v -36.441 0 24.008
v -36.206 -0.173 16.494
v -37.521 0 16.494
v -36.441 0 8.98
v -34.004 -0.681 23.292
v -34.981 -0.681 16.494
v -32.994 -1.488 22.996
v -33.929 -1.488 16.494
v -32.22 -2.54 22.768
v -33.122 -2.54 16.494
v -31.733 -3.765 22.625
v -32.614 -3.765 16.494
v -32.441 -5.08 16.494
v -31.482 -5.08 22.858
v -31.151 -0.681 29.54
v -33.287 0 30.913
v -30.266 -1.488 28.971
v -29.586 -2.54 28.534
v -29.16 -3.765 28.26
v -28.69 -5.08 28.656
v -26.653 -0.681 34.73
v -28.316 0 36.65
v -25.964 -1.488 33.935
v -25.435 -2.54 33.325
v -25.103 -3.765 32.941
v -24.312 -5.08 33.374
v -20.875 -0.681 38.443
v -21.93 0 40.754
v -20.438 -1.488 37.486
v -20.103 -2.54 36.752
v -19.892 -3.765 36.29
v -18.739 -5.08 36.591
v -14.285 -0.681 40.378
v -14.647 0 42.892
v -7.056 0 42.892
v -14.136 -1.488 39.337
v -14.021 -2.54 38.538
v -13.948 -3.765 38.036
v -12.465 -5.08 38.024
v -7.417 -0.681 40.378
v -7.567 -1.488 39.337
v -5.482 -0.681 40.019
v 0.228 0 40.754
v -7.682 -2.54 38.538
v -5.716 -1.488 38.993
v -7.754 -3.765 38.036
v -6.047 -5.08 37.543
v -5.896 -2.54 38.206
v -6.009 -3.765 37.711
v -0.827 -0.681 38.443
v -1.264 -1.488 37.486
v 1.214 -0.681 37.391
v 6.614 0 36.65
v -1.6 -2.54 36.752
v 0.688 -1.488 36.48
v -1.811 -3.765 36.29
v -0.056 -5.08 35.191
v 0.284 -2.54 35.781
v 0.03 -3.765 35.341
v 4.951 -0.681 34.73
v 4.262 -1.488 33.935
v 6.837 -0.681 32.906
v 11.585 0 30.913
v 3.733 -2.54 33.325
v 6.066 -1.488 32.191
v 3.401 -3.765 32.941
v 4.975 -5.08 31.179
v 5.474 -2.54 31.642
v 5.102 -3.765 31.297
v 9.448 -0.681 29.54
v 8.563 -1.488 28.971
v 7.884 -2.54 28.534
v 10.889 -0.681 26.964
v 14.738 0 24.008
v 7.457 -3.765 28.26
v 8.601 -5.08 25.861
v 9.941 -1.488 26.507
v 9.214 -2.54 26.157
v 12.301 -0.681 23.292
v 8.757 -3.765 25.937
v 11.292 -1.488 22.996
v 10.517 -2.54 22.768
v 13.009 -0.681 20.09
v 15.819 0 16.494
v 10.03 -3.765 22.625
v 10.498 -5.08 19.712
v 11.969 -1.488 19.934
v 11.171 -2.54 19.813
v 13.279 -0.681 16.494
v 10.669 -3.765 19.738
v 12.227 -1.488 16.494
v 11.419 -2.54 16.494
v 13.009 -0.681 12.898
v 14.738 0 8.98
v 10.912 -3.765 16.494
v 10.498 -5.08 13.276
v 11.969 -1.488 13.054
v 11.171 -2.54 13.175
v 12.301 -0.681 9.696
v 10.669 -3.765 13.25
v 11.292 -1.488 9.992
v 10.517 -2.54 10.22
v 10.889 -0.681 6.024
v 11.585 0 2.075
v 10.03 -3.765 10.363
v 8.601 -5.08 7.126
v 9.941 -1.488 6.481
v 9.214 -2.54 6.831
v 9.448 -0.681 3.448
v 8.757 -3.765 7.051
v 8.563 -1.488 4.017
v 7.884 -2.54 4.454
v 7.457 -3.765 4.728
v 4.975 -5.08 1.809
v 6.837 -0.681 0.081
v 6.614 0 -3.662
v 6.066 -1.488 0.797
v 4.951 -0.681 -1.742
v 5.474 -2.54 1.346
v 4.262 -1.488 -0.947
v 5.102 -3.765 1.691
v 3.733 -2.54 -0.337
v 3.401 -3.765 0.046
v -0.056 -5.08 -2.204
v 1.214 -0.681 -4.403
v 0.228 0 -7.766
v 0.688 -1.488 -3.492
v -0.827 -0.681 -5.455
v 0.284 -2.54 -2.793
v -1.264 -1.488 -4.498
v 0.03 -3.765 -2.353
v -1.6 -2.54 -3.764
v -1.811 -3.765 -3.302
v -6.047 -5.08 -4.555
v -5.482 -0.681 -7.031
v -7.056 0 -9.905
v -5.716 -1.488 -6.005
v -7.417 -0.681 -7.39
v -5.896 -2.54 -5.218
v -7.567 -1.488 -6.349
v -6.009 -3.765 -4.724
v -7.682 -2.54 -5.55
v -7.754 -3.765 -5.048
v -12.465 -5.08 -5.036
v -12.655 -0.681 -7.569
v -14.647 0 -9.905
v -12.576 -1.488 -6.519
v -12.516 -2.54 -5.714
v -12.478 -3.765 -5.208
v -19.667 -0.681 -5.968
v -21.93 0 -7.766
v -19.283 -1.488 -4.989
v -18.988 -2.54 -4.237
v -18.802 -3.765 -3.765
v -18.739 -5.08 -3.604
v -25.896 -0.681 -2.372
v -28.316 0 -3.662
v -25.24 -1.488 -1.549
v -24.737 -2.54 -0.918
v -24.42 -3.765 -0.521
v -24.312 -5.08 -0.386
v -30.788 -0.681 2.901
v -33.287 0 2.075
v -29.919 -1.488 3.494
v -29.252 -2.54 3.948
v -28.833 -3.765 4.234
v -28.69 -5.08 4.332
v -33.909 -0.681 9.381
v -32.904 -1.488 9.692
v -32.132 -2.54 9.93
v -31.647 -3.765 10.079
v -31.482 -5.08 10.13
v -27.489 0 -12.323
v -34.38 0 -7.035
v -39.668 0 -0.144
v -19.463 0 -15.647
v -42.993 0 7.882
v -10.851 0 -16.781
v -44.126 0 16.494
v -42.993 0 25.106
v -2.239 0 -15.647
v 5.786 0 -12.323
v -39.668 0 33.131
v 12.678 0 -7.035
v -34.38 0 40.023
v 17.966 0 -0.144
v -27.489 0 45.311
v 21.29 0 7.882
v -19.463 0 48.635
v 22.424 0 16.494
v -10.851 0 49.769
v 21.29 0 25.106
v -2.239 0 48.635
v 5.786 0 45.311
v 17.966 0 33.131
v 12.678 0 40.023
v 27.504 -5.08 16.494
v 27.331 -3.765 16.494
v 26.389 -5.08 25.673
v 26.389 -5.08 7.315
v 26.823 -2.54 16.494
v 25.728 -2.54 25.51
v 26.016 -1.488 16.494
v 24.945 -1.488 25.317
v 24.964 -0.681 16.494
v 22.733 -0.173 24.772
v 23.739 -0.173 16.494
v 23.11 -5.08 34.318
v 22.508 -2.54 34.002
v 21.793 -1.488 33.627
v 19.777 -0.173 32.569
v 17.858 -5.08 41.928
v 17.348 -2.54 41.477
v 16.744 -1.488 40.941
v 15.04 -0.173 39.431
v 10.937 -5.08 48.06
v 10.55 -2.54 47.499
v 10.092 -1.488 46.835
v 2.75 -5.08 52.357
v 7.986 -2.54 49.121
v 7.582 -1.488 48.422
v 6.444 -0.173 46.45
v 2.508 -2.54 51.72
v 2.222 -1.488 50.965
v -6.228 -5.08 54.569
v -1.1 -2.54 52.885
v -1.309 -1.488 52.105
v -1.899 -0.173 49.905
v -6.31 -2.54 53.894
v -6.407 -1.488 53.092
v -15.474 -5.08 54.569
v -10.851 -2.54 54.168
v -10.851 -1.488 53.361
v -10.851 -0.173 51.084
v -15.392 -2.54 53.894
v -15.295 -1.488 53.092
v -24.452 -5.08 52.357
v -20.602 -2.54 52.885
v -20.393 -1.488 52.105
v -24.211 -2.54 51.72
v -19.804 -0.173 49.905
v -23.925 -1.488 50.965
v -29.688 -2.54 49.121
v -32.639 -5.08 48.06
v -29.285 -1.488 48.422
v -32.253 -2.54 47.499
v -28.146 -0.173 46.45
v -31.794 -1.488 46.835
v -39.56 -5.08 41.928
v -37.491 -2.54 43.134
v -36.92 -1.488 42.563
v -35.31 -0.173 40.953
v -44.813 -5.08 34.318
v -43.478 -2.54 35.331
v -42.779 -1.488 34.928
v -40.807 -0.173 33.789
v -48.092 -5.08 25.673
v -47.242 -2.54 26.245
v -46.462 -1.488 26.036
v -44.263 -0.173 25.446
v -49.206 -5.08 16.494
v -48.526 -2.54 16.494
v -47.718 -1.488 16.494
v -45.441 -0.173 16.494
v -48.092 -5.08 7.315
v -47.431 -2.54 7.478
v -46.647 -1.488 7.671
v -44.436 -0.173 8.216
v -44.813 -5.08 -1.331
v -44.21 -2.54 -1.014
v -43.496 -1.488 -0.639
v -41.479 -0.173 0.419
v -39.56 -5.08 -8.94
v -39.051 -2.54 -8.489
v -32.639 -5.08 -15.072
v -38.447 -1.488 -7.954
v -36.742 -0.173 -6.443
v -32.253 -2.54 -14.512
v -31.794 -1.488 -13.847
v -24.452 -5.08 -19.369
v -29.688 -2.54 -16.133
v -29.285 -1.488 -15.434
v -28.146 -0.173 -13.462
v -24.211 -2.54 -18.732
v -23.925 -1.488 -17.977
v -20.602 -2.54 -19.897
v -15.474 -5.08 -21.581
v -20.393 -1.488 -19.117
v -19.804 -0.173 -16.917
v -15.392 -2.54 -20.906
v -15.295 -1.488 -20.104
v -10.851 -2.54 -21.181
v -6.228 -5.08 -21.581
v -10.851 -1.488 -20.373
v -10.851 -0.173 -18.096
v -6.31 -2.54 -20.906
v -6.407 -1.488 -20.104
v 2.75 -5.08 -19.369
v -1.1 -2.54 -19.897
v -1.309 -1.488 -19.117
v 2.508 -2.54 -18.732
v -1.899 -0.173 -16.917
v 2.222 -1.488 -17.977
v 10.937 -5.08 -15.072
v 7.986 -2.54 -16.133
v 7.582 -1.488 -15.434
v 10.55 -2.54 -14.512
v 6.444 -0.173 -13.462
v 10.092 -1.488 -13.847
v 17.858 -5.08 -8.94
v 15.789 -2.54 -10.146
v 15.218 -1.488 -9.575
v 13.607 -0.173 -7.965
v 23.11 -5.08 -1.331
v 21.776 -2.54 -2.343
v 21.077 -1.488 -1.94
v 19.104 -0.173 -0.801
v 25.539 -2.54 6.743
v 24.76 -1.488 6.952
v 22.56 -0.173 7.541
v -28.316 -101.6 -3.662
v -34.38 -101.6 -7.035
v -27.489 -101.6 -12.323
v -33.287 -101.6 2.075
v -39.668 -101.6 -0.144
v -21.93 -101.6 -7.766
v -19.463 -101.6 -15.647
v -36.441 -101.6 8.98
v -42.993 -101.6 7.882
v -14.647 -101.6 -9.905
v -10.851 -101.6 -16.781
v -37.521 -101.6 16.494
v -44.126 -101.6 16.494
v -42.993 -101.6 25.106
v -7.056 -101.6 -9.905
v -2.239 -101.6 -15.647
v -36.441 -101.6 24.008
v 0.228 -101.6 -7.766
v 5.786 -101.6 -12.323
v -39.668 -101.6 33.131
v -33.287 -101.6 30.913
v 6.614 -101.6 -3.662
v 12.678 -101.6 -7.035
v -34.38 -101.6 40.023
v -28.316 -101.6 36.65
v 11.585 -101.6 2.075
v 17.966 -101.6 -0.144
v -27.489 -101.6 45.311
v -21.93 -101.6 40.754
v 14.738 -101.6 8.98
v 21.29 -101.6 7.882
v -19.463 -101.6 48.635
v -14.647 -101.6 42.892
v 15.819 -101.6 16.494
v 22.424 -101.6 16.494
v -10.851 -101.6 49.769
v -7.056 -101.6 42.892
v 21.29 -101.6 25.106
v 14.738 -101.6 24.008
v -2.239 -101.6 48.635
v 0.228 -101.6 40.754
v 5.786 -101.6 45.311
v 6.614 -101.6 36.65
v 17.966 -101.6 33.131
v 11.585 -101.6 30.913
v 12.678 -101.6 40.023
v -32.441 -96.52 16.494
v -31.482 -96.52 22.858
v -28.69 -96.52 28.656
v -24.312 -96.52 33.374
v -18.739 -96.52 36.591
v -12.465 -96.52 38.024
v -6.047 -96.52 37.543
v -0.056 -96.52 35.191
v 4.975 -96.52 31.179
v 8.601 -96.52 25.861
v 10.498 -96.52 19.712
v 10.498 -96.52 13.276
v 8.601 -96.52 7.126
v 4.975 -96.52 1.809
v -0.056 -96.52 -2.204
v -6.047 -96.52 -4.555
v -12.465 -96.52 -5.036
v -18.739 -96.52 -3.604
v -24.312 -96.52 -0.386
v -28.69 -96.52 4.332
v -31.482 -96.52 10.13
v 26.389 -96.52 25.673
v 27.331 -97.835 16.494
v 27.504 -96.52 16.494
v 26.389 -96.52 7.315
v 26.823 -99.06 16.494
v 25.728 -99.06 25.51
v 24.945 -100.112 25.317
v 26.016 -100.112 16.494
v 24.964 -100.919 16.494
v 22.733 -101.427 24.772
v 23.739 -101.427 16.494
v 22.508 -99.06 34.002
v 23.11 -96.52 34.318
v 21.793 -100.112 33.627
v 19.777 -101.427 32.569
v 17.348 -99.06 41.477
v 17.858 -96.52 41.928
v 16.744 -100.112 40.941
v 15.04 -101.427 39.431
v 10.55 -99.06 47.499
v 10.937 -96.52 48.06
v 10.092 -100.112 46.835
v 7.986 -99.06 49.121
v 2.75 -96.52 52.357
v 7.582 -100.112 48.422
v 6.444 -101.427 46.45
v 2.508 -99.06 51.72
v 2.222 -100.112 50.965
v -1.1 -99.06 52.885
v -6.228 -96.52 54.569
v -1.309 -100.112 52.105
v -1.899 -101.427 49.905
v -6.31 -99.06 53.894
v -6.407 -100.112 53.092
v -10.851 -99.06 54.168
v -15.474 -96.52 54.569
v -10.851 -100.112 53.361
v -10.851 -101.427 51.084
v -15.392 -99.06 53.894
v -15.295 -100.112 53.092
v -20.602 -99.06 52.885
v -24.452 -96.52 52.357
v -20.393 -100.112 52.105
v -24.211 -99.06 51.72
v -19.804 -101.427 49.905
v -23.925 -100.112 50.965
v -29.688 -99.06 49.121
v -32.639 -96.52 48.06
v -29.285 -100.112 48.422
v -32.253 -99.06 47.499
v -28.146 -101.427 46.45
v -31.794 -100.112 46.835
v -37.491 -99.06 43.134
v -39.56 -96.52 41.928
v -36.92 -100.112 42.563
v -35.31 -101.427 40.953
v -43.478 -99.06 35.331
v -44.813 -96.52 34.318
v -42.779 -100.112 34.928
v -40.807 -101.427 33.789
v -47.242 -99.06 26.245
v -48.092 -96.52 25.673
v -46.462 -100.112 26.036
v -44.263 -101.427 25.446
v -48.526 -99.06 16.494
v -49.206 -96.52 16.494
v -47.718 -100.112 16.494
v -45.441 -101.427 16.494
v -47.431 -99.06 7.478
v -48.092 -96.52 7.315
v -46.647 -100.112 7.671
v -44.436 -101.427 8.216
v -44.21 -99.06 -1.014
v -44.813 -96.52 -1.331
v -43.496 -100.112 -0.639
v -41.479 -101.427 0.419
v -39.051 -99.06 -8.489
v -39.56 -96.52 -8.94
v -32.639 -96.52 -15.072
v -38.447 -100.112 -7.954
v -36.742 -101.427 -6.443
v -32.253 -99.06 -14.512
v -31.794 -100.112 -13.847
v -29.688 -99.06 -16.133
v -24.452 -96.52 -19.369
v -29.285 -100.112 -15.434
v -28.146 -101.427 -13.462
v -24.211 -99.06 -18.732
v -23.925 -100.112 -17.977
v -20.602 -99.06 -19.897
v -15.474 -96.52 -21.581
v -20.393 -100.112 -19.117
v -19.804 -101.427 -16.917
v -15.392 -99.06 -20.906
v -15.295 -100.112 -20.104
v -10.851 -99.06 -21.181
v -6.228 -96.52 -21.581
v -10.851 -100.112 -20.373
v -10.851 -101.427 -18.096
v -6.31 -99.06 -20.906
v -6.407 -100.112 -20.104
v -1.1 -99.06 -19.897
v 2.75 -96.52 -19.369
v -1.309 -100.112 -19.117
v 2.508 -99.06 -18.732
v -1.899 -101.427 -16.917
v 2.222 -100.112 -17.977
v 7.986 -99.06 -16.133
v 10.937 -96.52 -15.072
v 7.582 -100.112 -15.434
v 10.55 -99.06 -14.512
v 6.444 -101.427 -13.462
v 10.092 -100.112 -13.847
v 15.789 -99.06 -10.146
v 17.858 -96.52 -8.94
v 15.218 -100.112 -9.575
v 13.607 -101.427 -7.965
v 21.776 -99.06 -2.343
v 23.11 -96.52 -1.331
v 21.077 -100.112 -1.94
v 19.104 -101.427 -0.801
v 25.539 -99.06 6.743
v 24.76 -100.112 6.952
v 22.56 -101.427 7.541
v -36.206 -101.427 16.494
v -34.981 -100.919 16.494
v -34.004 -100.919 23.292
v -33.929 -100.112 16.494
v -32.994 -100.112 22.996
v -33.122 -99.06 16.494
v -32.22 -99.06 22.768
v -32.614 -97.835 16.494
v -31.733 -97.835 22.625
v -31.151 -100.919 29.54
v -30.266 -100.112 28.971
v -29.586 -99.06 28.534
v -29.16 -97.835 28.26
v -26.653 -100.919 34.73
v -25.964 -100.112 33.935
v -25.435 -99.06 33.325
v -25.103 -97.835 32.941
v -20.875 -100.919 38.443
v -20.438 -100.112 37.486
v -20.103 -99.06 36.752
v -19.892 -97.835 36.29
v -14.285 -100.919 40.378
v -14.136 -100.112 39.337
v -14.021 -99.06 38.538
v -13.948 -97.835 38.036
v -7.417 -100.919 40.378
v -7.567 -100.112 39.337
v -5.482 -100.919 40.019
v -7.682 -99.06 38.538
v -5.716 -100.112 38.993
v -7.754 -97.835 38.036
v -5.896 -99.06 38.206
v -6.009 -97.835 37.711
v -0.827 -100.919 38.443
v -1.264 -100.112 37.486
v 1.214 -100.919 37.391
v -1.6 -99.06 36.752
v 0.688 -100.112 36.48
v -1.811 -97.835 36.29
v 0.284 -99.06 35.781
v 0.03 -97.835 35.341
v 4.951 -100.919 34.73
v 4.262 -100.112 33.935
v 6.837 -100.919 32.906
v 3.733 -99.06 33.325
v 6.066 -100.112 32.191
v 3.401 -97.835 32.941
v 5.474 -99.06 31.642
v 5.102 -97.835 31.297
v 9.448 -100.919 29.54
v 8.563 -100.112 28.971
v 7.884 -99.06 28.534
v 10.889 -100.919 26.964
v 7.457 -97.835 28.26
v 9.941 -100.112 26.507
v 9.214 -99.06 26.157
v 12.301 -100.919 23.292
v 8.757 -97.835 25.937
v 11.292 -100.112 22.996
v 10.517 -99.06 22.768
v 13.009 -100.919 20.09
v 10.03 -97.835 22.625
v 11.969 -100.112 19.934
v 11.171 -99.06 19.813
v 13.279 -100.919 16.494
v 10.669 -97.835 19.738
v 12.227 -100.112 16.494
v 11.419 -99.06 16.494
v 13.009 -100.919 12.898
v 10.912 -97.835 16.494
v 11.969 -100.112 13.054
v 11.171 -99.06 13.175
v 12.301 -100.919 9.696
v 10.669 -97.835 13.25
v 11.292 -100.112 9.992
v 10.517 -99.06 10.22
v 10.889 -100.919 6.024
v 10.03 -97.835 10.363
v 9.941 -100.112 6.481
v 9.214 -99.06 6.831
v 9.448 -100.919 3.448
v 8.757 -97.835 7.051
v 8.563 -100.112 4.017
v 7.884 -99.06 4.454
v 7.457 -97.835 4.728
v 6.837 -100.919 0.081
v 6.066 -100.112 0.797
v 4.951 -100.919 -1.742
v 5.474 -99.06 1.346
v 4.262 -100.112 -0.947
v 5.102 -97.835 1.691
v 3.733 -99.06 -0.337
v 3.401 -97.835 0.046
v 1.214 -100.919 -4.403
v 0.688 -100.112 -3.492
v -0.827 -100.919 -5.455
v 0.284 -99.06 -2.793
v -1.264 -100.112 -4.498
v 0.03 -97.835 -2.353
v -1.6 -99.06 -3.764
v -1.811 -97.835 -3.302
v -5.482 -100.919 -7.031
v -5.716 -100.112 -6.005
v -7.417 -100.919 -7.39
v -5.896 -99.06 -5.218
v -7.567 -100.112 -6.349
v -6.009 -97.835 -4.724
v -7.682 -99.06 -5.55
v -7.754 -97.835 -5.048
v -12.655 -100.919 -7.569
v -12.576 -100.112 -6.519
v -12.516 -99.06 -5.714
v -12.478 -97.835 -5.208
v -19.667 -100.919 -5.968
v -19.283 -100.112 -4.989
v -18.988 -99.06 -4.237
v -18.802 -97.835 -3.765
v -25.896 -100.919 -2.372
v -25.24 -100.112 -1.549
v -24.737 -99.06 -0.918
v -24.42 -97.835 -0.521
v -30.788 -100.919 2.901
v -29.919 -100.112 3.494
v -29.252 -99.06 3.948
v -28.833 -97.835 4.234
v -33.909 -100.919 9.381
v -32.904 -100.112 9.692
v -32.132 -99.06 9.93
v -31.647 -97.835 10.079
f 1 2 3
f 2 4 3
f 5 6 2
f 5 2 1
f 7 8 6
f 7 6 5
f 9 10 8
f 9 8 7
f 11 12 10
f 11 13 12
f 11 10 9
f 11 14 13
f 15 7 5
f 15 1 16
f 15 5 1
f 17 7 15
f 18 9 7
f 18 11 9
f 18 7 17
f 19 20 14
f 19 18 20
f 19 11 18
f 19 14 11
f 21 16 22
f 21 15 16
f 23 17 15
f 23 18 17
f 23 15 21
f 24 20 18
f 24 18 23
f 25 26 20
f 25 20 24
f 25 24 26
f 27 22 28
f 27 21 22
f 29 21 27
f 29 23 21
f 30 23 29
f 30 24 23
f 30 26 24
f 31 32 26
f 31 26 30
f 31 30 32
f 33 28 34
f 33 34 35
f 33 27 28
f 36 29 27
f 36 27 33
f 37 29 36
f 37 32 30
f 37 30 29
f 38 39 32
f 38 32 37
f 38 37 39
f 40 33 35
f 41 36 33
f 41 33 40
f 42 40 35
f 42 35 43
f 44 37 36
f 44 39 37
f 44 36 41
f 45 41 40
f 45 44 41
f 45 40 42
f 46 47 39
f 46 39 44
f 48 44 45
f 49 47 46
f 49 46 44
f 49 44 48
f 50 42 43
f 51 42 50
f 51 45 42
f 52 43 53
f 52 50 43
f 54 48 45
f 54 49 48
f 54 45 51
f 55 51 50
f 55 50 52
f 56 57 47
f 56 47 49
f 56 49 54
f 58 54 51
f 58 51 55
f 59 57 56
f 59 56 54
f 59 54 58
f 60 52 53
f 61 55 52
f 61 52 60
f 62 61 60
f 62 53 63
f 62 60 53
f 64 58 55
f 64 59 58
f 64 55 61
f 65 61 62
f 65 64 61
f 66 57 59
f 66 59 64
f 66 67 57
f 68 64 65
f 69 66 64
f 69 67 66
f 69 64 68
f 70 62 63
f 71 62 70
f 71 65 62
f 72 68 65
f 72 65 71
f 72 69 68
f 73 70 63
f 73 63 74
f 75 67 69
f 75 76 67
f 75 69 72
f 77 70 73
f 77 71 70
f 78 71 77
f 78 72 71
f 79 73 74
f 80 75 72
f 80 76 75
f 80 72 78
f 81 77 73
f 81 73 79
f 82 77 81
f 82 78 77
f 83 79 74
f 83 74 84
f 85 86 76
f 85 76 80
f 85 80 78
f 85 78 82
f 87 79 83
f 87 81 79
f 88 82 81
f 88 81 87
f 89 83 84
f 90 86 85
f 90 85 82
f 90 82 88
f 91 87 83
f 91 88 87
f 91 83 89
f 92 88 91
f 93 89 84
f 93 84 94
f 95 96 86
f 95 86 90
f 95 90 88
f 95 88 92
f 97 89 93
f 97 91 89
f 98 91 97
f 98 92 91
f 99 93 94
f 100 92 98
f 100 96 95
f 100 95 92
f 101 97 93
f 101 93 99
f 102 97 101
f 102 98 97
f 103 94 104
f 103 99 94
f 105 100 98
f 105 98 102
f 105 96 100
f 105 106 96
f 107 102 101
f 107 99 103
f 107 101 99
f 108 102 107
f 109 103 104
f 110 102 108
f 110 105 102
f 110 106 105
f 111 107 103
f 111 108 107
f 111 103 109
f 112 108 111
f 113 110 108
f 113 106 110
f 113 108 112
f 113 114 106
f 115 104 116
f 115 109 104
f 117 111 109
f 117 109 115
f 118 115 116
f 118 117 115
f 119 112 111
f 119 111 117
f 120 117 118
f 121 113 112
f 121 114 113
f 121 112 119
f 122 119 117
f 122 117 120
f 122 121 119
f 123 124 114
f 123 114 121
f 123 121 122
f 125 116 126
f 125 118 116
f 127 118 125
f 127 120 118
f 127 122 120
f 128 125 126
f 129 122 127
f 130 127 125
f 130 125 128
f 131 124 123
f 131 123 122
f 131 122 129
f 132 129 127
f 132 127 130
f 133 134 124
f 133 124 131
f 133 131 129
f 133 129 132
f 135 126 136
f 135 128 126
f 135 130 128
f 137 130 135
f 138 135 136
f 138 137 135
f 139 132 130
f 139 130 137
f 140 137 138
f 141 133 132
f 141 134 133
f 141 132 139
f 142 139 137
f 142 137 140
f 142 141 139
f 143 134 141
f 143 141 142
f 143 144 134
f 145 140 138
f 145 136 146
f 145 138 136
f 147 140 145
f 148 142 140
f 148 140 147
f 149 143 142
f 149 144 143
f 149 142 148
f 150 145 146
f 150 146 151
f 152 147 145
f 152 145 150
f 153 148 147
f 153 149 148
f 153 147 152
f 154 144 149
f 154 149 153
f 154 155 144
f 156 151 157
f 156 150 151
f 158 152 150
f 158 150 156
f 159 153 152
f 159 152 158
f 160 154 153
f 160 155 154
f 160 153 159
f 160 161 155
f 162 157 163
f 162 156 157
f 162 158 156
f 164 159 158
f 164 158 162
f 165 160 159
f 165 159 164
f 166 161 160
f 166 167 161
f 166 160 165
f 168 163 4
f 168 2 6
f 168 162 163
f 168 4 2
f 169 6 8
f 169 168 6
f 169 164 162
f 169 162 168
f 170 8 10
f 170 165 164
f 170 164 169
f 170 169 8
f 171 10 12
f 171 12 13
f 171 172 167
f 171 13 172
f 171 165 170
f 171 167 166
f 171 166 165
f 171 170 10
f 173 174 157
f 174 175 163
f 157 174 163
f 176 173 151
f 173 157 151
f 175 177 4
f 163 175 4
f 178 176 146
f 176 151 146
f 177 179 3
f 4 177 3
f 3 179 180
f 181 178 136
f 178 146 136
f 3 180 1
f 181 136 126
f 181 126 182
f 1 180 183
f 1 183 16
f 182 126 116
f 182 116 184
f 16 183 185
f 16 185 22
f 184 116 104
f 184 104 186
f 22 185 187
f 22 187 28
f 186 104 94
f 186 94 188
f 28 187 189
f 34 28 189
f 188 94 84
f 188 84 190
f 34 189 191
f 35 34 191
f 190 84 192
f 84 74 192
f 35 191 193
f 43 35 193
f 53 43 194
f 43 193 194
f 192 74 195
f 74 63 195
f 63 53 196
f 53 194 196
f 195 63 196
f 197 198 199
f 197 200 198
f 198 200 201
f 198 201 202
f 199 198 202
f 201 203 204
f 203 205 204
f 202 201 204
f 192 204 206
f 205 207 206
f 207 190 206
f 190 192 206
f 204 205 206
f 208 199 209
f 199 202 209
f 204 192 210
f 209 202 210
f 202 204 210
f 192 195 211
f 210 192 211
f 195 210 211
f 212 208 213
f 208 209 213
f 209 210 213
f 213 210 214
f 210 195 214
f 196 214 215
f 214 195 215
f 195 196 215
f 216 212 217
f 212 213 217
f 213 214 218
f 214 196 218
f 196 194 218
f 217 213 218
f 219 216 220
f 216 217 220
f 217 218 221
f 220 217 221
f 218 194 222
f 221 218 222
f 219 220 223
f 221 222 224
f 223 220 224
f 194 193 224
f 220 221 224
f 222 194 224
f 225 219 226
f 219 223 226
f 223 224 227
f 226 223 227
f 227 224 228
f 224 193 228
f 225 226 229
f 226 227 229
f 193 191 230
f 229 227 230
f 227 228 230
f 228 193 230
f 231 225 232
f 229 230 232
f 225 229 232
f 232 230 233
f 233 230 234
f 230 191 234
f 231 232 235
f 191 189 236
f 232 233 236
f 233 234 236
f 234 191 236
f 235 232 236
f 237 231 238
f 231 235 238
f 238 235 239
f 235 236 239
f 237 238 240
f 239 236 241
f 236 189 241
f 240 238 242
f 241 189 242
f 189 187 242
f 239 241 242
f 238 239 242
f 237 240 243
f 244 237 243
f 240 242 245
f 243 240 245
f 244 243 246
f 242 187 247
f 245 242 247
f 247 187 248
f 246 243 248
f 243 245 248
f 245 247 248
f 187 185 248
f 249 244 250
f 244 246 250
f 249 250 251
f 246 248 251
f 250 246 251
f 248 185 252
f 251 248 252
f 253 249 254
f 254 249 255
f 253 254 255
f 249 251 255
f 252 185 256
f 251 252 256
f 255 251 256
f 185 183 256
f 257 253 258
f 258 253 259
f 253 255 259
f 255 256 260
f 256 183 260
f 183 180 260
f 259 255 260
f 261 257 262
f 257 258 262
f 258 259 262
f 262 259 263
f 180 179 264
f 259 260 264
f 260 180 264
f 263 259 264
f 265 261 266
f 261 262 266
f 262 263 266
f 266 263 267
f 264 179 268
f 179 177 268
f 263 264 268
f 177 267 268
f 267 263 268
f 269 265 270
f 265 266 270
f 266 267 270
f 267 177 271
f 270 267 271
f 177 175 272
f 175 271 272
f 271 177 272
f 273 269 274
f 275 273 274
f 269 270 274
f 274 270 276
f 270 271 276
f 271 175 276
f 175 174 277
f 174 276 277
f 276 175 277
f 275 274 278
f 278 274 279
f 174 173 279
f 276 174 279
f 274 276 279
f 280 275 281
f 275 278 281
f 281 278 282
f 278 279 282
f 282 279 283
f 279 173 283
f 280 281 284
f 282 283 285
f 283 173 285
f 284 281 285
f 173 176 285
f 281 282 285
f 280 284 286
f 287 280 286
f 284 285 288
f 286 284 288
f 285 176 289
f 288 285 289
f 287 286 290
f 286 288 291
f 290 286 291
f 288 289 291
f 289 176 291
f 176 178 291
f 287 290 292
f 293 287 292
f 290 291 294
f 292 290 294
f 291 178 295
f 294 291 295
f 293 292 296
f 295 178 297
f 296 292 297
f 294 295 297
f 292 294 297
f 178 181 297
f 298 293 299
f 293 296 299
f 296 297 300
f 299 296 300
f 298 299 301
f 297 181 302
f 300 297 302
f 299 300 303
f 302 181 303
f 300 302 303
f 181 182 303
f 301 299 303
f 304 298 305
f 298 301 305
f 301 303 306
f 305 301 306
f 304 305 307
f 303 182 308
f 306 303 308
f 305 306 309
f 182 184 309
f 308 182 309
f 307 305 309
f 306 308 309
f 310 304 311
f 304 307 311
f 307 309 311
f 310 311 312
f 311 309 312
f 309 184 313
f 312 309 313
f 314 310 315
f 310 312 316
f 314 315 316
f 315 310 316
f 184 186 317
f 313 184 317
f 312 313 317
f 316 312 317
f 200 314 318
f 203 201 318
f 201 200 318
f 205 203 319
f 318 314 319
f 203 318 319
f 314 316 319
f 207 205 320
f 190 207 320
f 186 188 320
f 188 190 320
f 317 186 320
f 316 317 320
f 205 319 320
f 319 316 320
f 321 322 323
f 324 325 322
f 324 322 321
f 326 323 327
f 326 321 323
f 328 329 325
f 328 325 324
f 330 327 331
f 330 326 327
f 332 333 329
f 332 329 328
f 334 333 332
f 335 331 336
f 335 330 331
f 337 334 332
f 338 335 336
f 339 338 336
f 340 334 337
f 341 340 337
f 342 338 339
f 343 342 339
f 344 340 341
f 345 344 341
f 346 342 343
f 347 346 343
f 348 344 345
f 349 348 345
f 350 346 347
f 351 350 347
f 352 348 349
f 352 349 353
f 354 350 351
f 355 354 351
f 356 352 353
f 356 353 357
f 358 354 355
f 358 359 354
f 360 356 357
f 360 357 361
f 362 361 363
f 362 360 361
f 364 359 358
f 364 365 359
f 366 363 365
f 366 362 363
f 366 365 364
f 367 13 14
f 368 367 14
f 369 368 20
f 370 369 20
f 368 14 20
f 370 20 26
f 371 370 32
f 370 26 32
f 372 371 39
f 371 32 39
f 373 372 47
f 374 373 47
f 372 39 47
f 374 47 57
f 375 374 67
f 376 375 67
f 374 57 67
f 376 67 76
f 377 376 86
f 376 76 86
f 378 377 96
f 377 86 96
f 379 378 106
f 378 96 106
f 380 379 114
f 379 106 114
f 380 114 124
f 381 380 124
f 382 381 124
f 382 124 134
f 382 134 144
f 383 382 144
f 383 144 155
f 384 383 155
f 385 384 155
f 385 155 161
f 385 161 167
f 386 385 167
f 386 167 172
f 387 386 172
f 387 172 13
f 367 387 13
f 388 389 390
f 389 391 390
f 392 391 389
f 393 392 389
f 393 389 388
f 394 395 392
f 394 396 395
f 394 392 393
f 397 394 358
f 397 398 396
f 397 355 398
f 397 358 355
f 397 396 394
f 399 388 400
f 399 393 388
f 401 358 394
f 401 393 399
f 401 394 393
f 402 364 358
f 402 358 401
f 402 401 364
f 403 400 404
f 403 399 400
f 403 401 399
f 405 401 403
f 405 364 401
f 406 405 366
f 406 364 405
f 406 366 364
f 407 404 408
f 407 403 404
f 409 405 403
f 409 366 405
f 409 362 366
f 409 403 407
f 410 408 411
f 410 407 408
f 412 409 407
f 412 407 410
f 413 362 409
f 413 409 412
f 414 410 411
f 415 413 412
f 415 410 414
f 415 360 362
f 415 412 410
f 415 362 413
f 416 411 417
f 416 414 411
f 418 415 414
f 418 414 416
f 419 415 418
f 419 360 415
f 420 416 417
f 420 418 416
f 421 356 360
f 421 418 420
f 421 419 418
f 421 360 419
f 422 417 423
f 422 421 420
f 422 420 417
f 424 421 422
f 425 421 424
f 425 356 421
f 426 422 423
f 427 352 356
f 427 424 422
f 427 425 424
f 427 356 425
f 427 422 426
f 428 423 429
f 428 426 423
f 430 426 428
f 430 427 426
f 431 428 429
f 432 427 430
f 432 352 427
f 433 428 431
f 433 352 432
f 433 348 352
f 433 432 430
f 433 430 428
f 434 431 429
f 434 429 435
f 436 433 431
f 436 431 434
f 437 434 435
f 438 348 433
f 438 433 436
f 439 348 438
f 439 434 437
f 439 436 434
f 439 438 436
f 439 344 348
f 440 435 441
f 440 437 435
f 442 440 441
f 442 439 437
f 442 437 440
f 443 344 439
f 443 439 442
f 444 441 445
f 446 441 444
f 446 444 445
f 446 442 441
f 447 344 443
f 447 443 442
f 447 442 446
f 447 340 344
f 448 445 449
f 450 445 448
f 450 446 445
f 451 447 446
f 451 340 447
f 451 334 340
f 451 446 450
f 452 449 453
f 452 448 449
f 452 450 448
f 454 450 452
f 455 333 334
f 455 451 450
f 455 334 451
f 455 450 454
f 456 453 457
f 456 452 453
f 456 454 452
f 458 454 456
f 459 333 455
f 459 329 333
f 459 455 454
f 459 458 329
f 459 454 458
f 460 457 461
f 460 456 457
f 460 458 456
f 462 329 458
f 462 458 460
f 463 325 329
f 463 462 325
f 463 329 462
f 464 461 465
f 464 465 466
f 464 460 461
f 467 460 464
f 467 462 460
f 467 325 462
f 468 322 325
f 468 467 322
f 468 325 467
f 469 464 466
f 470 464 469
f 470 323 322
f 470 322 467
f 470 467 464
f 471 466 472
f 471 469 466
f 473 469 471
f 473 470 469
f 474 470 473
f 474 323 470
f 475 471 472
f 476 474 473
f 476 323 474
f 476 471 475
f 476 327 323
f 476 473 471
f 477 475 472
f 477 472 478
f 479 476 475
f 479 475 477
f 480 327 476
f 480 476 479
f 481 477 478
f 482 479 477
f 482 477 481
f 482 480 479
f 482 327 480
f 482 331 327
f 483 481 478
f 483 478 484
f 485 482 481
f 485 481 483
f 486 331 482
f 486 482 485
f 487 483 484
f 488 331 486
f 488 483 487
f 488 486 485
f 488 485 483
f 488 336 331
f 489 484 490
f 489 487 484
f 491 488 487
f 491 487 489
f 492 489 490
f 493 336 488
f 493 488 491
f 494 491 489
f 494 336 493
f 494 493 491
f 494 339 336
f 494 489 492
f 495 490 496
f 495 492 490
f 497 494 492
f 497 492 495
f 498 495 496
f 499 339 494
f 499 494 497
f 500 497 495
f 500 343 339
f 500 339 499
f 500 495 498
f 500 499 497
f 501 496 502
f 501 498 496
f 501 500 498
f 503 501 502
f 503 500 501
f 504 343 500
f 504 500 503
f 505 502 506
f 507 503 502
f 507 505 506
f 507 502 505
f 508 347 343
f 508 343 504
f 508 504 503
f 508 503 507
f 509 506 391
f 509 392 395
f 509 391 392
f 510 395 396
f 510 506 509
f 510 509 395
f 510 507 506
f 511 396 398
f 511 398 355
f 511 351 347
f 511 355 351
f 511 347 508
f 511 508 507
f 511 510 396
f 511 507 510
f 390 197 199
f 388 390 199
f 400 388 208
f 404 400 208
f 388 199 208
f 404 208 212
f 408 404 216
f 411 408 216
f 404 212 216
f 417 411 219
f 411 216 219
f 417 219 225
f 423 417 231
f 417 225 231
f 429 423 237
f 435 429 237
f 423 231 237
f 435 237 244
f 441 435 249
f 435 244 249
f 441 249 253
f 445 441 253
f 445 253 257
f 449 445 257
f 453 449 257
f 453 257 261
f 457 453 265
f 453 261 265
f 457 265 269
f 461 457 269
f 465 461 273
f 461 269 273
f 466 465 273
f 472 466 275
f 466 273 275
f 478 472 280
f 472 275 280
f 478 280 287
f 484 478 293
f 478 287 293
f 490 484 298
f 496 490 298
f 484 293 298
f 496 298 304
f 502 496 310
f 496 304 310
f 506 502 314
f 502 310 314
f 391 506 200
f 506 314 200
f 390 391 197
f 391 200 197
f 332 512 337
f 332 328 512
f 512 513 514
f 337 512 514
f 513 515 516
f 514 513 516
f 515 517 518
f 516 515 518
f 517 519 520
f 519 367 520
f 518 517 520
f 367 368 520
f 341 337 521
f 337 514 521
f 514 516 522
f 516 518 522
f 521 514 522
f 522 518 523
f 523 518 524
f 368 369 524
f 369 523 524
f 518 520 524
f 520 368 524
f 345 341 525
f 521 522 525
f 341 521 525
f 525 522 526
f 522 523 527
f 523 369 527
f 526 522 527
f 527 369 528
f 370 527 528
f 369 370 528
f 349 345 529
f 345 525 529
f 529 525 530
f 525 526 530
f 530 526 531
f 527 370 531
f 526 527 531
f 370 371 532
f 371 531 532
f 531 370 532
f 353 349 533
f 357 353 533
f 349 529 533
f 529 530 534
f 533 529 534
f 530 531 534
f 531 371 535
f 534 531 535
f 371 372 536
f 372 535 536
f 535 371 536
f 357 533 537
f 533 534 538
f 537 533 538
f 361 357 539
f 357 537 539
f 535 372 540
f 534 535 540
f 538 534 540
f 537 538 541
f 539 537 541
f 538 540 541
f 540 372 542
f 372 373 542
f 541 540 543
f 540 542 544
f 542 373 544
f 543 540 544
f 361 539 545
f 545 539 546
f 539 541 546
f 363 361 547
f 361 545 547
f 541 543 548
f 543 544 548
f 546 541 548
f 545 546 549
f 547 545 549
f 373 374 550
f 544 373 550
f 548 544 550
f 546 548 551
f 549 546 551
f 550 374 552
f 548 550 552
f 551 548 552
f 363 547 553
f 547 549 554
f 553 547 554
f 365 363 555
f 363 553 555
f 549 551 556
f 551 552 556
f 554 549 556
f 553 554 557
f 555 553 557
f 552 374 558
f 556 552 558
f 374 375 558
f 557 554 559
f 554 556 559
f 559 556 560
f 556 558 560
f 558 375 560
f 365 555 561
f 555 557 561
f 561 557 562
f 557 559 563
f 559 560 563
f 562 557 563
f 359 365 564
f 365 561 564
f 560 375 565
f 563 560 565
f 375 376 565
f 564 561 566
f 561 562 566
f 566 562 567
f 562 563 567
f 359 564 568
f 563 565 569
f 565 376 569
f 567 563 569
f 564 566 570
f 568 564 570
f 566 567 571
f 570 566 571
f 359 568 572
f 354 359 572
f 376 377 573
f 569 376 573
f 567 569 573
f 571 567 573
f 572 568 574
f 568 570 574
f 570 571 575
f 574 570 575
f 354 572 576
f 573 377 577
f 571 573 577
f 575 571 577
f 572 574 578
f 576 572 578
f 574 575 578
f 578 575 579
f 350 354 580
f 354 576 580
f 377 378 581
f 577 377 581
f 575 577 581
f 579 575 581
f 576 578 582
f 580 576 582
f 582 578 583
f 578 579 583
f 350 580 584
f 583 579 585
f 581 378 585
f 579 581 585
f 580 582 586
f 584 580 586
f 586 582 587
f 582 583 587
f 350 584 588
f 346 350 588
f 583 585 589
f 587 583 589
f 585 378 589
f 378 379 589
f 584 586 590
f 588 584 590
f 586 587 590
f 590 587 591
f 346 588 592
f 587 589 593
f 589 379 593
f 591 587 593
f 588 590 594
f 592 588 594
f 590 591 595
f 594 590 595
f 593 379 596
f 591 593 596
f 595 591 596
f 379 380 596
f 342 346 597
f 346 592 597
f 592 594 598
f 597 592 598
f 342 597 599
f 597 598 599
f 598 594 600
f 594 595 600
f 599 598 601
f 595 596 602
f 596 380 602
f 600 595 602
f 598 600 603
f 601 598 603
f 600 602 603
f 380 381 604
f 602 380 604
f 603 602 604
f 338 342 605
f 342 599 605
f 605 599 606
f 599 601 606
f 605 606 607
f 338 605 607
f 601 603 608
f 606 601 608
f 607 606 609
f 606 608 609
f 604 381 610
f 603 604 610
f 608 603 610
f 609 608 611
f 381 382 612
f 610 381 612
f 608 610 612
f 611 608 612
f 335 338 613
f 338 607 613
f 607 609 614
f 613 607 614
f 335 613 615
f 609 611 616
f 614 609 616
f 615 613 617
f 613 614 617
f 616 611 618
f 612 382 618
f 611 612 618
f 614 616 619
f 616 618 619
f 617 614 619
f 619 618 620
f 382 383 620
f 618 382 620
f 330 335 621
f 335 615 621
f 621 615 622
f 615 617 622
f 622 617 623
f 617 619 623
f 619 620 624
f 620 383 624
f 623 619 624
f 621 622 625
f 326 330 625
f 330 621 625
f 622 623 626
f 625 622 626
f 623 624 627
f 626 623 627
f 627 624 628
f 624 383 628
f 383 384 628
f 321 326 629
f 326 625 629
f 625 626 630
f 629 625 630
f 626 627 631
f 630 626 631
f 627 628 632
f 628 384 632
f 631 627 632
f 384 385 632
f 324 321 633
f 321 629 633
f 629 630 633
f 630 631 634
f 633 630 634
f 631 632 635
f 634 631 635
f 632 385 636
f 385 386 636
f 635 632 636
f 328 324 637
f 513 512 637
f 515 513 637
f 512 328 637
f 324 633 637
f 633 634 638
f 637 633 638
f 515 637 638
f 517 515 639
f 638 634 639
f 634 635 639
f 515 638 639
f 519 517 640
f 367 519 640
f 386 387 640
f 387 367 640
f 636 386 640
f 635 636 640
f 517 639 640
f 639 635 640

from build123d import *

# Parameters (mm, degrees)
F0_R     = 38.355059125
F1_DEPTH = 101.6
F3_D     = 43.18
F4_R     = 5.08
F5_R     = 5.08


with BuildPart() as f1:
    # F0 (on Front) → F1 (new body)
    with BuildSketch(Plane.XZ):
        with Locations((-10.8512658626, 16.4939239621)):
            Circle(F0_R)
    extrude(amount=F1_DEPTH)

    # F3 (through all)
    with Locations(Plane.XZ.offset(101.6)):
        with Locations((-10.8512658626, 16.4939239621)):
            Hole(F3_D / 2)

    # F4
    f4_edges = [f1.edges().sort_by_distance(p)[0] for p in [
        (-49.206325, 0, 16.493924),
        (-32.441266, 0, 16.493924),
    ]]
    fillet(f4_edges, radius=F4_R)

    # F5
    f5_edges = [f1.edges().sort_by_distance(p)[0] for p in [
        (-49.206325, -101.6, 16.493924),
        (-32.441266, -101.6, 16.493924),
    ]]
    fillet(f5_edges, radius=F5_R)


solid = f1.part
